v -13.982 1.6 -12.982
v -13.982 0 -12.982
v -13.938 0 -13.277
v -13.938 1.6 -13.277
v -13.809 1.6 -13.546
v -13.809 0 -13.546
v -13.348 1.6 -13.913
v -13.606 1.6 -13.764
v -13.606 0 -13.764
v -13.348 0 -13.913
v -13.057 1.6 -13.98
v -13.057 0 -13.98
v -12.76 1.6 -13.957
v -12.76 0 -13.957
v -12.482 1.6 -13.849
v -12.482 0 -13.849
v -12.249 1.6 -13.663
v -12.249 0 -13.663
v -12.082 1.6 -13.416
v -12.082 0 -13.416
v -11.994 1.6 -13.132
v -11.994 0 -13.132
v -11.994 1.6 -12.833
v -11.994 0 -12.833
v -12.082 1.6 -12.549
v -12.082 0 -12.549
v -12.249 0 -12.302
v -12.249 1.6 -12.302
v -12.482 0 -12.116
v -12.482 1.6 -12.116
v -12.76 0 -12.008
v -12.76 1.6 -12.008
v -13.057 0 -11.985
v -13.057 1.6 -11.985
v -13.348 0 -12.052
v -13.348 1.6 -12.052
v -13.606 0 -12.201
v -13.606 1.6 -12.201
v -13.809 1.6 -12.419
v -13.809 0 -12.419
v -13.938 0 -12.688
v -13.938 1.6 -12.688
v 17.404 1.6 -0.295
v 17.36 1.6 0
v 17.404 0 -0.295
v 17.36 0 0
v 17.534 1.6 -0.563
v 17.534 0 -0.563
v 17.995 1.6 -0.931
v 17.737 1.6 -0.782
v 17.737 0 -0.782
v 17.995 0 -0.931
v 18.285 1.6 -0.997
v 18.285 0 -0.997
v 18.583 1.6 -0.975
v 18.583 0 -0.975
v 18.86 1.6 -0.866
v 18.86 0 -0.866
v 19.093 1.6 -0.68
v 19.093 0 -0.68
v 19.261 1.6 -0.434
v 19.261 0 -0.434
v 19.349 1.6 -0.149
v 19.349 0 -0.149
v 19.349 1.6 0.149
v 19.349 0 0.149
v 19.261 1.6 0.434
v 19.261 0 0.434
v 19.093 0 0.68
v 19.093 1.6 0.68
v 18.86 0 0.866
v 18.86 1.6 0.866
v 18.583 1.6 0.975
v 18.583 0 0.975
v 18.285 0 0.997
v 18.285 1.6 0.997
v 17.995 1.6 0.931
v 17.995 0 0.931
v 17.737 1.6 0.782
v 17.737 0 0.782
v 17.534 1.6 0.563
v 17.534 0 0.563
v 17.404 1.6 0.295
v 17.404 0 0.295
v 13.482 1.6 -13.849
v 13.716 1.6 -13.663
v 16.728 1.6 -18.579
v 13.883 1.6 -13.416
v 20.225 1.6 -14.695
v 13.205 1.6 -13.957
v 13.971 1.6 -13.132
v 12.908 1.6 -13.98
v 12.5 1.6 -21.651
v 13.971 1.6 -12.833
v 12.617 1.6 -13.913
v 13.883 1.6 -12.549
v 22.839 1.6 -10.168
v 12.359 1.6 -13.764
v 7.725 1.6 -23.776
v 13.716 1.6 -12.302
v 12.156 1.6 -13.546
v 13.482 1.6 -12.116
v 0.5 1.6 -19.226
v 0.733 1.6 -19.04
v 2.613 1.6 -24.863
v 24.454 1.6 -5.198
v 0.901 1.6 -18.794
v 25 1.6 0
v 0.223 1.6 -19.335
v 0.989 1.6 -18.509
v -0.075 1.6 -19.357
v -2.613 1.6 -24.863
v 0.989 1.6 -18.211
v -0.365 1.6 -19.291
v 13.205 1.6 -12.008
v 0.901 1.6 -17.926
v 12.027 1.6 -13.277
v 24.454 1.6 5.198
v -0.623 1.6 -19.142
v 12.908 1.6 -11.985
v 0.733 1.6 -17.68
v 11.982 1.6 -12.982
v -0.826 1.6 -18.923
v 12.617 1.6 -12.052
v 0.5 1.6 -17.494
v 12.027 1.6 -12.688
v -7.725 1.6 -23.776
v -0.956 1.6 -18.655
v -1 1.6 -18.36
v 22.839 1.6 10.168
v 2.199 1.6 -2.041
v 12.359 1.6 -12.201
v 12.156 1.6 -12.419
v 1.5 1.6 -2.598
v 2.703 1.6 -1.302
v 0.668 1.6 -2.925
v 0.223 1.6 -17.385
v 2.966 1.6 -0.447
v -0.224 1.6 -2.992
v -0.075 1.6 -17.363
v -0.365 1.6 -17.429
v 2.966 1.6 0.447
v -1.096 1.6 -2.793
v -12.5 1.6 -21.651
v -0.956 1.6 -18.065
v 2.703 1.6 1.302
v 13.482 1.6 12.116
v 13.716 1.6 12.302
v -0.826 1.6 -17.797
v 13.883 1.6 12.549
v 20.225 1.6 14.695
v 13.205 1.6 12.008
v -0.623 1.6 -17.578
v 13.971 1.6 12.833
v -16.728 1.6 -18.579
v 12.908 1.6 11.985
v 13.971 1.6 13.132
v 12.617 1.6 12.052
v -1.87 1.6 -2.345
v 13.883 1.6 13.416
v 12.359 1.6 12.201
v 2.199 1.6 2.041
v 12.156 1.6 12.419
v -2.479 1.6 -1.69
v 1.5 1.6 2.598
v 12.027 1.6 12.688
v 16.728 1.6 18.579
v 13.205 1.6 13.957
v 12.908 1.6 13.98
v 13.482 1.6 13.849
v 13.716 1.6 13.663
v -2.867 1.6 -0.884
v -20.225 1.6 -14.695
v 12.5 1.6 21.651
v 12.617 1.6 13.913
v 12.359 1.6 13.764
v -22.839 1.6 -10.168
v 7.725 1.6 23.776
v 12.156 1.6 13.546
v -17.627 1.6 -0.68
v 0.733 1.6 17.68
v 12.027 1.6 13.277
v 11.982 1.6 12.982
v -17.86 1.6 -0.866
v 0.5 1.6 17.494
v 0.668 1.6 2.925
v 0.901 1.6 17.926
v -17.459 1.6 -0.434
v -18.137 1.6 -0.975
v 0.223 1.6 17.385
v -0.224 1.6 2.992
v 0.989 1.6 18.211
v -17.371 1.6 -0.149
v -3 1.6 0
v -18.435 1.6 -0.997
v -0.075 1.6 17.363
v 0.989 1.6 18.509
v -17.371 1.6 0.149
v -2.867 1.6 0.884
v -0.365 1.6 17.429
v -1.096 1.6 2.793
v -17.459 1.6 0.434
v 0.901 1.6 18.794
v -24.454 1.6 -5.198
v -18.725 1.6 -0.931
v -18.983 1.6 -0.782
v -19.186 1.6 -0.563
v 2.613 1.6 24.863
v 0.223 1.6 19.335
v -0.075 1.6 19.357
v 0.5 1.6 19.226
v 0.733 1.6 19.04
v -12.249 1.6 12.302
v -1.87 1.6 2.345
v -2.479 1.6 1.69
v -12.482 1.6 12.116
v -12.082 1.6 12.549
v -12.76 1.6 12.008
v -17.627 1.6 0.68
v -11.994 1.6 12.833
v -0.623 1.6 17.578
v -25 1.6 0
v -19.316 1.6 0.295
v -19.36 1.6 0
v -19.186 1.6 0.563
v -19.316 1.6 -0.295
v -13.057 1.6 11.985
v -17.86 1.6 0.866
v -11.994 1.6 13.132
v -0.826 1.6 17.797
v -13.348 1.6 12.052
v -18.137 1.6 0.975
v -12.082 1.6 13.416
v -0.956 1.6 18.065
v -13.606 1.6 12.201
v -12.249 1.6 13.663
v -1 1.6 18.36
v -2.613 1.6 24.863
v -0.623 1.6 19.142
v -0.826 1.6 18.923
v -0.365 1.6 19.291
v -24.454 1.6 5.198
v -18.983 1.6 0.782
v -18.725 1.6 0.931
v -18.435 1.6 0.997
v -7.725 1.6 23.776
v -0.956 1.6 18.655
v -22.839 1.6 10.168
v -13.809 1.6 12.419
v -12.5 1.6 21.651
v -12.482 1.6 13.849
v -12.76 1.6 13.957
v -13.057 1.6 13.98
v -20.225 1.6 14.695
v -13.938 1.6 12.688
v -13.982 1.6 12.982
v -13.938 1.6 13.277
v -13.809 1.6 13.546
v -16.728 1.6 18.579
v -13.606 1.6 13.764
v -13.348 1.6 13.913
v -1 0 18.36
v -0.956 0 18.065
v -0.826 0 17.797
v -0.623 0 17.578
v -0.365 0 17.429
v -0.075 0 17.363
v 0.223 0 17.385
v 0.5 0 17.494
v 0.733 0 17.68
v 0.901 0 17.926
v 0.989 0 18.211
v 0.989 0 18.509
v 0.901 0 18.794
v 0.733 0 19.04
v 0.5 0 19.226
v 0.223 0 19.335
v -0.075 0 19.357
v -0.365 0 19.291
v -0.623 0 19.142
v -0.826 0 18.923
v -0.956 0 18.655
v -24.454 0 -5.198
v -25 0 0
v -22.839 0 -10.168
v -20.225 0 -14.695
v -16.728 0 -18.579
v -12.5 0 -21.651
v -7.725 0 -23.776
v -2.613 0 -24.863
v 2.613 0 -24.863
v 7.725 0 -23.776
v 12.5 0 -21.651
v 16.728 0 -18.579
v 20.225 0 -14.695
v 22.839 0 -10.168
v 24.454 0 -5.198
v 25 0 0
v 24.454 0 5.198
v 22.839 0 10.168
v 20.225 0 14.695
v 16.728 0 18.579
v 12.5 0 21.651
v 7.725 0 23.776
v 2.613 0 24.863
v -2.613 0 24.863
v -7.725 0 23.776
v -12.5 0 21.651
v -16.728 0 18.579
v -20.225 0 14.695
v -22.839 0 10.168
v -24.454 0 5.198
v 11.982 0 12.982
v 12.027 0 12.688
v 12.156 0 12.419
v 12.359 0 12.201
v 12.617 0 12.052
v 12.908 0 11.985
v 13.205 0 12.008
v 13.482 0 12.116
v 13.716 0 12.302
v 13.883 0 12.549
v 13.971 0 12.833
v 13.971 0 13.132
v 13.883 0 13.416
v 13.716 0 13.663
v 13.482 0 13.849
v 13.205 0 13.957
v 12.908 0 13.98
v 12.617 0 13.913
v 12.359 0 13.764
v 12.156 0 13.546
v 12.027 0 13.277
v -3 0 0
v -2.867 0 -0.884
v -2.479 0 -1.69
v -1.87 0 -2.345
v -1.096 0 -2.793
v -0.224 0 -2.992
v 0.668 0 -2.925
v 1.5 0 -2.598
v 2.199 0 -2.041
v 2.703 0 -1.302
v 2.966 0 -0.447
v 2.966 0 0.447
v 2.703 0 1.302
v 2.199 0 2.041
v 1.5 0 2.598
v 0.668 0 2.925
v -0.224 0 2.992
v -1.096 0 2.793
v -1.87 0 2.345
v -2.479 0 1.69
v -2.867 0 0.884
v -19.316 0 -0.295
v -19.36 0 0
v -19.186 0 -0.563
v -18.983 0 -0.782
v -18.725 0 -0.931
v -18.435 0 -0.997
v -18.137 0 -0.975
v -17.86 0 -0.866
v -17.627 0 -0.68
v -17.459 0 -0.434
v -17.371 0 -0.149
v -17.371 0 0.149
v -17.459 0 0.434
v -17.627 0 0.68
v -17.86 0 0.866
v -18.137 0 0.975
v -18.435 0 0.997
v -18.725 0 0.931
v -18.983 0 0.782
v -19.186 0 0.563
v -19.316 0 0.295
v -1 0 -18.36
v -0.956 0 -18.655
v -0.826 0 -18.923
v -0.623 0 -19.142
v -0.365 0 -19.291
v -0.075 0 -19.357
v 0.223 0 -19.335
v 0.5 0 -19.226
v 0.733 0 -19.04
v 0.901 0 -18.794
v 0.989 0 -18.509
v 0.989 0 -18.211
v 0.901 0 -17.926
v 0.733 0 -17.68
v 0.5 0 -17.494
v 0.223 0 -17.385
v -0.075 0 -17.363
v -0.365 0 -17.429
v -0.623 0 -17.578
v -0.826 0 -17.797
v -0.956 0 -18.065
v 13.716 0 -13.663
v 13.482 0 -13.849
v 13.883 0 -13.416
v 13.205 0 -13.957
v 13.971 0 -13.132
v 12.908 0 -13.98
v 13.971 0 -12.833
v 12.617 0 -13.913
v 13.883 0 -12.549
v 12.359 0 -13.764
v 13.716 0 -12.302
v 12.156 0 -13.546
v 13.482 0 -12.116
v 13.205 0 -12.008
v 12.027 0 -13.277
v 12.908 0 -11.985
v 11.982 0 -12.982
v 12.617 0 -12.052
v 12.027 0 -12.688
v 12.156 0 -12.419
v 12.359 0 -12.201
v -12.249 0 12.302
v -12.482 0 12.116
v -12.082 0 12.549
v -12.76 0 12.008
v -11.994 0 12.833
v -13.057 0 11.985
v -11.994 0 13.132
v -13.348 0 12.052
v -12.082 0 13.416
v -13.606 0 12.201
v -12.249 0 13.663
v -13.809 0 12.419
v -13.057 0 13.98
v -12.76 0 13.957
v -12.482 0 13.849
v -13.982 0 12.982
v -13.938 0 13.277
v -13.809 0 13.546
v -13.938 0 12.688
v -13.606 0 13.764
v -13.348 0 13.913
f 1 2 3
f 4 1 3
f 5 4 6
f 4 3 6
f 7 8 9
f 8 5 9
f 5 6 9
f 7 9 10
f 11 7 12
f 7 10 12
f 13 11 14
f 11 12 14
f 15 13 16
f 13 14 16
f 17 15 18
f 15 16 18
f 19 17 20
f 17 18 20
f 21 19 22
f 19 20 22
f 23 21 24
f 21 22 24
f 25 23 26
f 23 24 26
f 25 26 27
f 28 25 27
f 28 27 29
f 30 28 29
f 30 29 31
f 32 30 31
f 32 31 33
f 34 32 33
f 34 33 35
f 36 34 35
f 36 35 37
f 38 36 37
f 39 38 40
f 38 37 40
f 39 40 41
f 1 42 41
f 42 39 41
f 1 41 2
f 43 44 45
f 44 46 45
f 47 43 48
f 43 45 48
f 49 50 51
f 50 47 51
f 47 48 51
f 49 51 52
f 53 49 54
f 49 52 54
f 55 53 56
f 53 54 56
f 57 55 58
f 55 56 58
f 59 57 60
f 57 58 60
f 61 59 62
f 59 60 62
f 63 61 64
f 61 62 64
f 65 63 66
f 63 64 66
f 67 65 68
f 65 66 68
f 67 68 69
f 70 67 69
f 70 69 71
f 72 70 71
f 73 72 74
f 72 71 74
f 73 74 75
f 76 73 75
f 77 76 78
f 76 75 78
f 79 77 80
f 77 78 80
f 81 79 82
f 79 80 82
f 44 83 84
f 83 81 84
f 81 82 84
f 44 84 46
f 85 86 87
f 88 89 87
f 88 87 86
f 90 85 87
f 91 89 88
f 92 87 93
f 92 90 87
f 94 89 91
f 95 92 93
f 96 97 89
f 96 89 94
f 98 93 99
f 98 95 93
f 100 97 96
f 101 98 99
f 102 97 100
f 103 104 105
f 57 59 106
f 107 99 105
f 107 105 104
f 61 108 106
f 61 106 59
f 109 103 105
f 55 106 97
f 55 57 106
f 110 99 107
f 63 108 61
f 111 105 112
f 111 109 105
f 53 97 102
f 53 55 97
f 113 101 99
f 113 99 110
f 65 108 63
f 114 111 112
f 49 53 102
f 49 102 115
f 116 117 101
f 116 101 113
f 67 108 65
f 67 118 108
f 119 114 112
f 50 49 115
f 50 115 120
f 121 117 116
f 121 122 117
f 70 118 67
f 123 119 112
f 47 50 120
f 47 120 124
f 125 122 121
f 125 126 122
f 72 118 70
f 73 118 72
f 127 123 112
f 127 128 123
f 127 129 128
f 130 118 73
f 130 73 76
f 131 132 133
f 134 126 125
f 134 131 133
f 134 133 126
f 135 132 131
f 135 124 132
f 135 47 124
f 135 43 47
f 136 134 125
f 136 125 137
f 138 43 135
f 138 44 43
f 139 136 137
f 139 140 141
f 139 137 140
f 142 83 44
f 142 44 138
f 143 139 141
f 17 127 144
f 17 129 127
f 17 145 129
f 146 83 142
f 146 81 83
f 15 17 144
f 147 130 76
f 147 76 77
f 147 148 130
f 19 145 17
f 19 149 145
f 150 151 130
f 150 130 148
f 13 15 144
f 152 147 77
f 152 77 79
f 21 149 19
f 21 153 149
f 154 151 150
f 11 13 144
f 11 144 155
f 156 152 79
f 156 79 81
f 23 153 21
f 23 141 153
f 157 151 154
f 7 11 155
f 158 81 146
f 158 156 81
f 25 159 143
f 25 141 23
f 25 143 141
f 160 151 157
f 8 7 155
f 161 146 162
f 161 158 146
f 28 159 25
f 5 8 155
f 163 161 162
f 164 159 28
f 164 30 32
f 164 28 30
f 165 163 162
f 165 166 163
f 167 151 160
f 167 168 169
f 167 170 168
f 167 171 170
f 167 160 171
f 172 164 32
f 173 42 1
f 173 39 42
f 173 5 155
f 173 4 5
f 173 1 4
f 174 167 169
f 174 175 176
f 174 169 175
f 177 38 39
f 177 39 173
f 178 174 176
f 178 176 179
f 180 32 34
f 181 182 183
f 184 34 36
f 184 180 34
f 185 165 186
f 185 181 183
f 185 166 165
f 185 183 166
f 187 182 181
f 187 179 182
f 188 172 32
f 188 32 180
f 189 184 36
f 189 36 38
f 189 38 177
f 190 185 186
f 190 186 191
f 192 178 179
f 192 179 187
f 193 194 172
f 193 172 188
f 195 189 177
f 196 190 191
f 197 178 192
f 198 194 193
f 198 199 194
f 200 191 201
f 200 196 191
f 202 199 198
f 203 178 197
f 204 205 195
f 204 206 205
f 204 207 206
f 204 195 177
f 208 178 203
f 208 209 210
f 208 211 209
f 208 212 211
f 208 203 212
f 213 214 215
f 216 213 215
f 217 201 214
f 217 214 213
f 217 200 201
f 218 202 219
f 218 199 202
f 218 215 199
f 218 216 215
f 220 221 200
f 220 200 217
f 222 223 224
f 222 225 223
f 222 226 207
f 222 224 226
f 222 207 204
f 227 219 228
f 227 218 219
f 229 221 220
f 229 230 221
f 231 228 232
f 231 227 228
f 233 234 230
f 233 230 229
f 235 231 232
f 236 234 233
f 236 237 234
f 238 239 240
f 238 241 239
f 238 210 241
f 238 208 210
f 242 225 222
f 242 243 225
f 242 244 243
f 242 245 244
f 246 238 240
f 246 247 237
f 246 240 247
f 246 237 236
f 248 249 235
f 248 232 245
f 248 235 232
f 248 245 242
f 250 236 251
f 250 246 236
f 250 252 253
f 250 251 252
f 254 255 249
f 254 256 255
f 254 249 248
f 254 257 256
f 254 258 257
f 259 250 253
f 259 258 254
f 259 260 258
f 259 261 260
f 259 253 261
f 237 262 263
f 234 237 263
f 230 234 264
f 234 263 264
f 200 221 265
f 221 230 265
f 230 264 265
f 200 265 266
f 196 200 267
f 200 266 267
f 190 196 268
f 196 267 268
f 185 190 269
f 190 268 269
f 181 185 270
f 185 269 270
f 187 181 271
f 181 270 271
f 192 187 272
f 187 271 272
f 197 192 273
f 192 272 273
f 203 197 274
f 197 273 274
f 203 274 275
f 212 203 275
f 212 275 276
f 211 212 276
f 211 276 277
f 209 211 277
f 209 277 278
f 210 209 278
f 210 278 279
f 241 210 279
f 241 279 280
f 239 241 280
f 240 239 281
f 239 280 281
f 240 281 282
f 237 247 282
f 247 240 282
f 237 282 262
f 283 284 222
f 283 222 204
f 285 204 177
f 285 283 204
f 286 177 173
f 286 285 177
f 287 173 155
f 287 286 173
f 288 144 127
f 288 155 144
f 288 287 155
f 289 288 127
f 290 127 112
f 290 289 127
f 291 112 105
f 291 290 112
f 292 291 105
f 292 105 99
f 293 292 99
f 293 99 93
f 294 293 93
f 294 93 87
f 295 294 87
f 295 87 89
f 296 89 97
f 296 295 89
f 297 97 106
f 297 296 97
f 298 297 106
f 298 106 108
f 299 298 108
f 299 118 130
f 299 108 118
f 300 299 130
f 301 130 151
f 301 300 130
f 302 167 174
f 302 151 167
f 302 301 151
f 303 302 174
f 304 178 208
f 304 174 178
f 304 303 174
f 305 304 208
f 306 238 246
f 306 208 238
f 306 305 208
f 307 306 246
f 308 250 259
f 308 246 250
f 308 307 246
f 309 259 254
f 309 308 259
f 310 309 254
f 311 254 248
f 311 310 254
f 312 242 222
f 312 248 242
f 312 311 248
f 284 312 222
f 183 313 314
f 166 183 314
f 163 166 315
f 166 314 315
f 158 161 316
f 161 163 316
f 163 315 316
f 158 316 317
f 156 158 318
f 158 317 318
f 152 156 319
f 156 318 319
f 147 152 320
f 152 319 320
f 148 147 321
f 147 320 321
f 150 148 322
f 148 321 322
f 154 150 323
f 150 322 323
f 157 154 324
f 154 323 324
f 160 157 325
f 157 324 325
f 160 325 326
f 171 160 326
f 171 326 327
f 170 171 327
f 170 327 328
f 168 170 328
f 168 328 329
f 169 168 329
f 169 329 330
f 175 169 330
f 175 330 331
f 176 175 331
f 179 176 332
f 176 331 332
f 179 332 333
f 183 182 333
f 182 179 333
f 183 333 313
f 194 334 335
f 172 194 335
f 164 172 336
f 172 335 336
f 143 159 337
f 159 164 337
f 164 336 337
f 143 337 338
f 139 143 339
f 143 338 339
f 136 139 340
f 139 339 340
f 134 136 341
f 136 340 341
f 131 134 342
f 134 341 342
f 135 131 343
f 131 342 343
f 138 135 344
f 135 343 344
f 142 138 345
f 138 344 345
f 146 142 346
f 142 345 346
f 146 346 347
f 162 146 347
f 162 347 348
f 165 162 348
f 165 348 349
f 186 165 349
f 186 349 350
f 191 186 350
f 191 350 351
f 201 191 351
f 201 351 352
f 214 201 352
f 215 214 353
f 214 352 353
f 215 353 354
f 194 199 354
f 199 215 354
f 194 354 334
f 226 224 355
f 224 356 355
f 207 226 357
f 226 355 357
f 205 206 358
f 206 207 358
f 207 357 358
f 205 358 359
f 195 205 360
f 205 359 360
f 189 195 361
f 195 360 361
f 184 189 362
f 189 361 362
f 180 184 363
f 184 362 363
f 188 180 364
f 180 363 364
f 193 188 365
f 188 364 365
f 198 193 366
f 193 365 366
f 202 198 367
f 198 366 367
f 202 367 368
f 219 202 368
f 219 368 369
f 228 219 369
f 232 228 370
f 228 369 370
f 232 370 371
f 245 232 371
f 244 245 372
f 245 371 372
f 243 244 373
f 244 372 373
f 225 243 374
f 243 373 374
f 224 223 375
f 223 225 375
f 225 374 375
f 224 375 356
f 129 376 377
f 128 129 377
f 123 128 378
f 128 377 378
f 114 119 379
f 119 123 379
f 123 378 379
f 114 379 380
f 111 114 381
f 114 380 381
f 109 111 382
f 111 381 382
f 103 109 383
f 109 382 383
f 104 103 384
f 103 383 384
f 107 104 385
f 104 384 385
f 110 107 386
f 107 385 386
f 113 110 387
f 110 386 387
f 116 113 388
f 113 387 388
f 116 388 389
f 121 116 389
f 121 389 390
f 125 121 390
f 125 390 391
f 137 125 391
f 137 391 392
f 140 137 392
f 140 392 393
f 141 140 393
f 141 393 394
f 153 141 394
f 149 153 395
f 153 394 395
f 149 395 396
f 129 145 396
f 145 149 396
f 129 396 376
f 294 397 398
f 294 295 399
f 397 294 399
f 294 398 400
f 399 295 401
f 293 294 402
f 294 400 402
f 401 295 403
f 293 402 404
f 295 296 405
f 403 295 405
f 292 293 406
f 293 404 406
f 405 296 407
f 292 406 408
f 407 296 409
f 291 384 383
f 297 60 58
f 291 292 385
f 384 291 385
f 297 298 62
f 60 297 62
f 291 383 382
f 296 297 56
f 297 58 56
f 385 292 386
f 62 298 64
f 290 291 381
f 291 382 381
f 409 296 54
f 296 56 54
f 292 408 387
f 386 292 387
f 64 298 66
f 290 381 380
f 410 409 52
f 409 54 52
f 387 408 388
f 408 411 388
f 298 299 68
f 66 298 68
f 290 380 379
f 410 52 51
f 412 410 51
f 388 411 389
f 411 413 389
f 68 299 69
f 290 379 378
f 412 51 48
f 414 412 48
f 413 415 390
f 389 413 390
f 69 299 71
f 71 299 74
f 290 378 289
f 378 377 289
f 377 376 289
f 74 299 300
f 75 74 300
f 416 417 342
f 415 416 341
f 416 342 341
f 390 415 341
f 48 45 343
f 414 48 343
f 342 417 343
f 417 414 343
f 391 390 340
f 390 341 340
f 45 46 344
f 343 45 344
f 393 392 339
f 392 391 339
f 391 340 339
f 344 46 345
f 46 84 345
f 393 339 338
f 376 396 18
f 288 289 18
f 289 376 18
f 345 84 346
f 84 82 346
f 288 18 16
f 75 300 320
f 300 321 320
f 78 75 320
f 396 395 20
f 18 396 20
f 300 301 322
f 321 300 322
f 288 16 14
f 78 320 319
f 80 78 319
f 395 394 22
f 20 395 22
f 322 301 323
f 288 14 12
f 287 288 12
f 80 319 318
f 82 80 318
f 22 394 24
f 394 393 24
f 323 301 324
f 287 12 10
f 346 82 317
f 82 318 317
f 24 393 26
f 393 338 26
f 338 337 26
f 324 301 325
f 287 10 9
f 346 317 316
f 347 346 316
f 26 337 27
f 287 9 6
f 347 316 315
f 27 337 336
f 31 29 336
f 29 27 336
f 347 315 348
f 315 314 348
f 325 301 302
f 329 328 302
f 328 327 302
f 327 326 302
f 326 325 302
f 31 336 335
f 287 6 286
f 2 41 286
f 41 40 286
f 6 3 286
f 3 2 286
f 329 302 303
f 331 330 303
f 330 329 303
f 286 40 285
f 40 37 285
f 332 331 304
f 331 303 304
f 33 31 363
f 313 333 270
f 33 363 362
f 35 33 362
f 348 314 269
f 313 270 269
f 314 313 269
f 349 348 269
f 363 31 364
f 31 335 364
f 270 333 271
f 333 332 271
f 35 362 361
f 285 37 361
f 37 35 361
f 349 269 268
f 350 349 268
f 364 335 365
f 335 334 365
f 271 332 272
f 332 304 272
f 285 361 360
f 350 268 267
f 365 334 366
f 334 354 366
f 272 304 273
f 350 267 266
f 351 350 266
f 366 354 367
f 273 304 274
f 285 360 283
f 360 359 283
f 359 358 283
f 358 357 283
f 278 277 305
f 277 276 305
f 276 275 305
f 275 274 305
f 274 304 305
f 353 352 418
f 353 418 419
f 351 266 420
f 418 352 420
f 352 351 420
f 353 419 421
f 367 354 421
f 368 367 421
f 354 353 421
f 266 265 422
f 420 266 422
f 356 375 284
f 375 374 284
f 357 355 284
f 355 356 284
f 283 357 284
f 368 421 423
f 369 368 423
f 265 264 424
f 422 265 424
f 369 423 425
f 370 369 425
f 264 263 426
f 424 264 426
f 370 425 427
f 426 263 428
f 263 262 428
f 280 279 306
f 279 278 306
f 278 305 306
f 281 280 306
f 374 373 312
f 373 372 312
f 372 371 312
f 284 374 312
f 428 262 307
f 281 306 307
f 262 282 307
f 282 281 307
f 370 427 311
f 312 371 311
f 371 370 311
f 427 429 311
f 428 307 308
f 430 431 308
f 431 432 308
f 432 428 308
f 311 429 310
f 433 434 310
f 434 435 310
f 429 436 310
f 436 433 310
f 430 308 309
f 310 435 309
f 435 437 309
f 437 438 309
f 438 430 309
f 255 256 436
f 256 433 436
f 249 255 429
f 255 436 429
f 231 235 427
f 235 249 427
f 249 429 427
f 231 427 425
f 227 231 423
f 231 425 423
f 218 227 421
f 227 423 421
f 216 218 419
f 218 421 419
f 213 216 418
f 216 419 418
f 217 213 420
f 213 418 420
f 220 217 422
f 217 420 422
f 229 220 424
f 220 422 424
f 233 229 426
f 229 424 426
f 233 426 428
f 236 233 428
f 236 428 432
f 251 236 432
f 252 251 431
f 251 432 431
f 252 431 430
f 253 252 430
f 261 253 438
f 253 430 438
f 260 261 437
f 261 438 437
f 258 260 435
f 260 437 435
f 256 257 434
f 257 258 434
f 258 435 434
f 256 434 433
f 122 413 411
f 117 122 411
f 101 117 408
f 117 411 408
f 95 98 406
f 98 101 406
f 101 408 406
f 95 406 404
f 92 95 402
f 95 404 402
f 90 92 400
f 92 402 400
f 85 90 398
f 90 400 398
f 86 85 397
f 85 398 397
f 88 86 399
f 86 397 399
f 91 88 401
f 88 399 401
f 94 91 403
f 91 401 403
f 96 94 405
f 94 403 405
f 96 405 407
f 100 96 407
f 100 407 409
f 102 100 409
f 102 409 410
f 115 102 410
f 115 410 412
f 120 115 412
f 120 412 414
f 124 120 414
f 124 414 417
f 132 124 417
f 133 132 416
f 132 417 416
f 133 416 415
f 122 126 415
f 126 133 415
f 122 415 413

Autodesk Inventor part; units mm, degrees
ref_plane "YZ Plane" through (0, 0, 0) normal (1, 0, 0) x (0, 1, 0)
ref_plane "XZ Plane" through (0, 0, 0) normal (0, 1, 0) x (-1, 0, 0)
ref_plane "XY Plane" through (0, 0, 0) normal (0, 0, 1) x (1, 0, 0)
sketch "Sketch1" plane through (0, 0, 0) normal (0, 1, 0) x (-1, 0, 0)
  circle A0 centre (0, 0) radius 25
  circle A1 centre (0, 0) radius 3
  circle A2 centre (0, 18.36) radius 1
  circle A3 centre (-12.9825, 12.9825) radius 1
  circle A4 centre (-18.36, 0) radius 1
  circle A5 centre (-12.9825, -12.9825) radius 1
  circle A6 centre (0, -18.36) radius 1
  circle A7 centre (12.9825, -12.9825) radius 1
  circle A8 centre (18.36, 0) radius 1
  circle A9 centre (12.9825, 12.9825) radius 1
  dimension "d0" = 50
  dimension "d1" = 6
  dimension "d2" = 2
  dimension "d3" = 18.36
  dimension "d6" = 360
extrude "Extrusion1" add sketch "Sketch1" along normal blind 1.6
properties part number "CUT_FR4_Bottom_Cone_PCB"
